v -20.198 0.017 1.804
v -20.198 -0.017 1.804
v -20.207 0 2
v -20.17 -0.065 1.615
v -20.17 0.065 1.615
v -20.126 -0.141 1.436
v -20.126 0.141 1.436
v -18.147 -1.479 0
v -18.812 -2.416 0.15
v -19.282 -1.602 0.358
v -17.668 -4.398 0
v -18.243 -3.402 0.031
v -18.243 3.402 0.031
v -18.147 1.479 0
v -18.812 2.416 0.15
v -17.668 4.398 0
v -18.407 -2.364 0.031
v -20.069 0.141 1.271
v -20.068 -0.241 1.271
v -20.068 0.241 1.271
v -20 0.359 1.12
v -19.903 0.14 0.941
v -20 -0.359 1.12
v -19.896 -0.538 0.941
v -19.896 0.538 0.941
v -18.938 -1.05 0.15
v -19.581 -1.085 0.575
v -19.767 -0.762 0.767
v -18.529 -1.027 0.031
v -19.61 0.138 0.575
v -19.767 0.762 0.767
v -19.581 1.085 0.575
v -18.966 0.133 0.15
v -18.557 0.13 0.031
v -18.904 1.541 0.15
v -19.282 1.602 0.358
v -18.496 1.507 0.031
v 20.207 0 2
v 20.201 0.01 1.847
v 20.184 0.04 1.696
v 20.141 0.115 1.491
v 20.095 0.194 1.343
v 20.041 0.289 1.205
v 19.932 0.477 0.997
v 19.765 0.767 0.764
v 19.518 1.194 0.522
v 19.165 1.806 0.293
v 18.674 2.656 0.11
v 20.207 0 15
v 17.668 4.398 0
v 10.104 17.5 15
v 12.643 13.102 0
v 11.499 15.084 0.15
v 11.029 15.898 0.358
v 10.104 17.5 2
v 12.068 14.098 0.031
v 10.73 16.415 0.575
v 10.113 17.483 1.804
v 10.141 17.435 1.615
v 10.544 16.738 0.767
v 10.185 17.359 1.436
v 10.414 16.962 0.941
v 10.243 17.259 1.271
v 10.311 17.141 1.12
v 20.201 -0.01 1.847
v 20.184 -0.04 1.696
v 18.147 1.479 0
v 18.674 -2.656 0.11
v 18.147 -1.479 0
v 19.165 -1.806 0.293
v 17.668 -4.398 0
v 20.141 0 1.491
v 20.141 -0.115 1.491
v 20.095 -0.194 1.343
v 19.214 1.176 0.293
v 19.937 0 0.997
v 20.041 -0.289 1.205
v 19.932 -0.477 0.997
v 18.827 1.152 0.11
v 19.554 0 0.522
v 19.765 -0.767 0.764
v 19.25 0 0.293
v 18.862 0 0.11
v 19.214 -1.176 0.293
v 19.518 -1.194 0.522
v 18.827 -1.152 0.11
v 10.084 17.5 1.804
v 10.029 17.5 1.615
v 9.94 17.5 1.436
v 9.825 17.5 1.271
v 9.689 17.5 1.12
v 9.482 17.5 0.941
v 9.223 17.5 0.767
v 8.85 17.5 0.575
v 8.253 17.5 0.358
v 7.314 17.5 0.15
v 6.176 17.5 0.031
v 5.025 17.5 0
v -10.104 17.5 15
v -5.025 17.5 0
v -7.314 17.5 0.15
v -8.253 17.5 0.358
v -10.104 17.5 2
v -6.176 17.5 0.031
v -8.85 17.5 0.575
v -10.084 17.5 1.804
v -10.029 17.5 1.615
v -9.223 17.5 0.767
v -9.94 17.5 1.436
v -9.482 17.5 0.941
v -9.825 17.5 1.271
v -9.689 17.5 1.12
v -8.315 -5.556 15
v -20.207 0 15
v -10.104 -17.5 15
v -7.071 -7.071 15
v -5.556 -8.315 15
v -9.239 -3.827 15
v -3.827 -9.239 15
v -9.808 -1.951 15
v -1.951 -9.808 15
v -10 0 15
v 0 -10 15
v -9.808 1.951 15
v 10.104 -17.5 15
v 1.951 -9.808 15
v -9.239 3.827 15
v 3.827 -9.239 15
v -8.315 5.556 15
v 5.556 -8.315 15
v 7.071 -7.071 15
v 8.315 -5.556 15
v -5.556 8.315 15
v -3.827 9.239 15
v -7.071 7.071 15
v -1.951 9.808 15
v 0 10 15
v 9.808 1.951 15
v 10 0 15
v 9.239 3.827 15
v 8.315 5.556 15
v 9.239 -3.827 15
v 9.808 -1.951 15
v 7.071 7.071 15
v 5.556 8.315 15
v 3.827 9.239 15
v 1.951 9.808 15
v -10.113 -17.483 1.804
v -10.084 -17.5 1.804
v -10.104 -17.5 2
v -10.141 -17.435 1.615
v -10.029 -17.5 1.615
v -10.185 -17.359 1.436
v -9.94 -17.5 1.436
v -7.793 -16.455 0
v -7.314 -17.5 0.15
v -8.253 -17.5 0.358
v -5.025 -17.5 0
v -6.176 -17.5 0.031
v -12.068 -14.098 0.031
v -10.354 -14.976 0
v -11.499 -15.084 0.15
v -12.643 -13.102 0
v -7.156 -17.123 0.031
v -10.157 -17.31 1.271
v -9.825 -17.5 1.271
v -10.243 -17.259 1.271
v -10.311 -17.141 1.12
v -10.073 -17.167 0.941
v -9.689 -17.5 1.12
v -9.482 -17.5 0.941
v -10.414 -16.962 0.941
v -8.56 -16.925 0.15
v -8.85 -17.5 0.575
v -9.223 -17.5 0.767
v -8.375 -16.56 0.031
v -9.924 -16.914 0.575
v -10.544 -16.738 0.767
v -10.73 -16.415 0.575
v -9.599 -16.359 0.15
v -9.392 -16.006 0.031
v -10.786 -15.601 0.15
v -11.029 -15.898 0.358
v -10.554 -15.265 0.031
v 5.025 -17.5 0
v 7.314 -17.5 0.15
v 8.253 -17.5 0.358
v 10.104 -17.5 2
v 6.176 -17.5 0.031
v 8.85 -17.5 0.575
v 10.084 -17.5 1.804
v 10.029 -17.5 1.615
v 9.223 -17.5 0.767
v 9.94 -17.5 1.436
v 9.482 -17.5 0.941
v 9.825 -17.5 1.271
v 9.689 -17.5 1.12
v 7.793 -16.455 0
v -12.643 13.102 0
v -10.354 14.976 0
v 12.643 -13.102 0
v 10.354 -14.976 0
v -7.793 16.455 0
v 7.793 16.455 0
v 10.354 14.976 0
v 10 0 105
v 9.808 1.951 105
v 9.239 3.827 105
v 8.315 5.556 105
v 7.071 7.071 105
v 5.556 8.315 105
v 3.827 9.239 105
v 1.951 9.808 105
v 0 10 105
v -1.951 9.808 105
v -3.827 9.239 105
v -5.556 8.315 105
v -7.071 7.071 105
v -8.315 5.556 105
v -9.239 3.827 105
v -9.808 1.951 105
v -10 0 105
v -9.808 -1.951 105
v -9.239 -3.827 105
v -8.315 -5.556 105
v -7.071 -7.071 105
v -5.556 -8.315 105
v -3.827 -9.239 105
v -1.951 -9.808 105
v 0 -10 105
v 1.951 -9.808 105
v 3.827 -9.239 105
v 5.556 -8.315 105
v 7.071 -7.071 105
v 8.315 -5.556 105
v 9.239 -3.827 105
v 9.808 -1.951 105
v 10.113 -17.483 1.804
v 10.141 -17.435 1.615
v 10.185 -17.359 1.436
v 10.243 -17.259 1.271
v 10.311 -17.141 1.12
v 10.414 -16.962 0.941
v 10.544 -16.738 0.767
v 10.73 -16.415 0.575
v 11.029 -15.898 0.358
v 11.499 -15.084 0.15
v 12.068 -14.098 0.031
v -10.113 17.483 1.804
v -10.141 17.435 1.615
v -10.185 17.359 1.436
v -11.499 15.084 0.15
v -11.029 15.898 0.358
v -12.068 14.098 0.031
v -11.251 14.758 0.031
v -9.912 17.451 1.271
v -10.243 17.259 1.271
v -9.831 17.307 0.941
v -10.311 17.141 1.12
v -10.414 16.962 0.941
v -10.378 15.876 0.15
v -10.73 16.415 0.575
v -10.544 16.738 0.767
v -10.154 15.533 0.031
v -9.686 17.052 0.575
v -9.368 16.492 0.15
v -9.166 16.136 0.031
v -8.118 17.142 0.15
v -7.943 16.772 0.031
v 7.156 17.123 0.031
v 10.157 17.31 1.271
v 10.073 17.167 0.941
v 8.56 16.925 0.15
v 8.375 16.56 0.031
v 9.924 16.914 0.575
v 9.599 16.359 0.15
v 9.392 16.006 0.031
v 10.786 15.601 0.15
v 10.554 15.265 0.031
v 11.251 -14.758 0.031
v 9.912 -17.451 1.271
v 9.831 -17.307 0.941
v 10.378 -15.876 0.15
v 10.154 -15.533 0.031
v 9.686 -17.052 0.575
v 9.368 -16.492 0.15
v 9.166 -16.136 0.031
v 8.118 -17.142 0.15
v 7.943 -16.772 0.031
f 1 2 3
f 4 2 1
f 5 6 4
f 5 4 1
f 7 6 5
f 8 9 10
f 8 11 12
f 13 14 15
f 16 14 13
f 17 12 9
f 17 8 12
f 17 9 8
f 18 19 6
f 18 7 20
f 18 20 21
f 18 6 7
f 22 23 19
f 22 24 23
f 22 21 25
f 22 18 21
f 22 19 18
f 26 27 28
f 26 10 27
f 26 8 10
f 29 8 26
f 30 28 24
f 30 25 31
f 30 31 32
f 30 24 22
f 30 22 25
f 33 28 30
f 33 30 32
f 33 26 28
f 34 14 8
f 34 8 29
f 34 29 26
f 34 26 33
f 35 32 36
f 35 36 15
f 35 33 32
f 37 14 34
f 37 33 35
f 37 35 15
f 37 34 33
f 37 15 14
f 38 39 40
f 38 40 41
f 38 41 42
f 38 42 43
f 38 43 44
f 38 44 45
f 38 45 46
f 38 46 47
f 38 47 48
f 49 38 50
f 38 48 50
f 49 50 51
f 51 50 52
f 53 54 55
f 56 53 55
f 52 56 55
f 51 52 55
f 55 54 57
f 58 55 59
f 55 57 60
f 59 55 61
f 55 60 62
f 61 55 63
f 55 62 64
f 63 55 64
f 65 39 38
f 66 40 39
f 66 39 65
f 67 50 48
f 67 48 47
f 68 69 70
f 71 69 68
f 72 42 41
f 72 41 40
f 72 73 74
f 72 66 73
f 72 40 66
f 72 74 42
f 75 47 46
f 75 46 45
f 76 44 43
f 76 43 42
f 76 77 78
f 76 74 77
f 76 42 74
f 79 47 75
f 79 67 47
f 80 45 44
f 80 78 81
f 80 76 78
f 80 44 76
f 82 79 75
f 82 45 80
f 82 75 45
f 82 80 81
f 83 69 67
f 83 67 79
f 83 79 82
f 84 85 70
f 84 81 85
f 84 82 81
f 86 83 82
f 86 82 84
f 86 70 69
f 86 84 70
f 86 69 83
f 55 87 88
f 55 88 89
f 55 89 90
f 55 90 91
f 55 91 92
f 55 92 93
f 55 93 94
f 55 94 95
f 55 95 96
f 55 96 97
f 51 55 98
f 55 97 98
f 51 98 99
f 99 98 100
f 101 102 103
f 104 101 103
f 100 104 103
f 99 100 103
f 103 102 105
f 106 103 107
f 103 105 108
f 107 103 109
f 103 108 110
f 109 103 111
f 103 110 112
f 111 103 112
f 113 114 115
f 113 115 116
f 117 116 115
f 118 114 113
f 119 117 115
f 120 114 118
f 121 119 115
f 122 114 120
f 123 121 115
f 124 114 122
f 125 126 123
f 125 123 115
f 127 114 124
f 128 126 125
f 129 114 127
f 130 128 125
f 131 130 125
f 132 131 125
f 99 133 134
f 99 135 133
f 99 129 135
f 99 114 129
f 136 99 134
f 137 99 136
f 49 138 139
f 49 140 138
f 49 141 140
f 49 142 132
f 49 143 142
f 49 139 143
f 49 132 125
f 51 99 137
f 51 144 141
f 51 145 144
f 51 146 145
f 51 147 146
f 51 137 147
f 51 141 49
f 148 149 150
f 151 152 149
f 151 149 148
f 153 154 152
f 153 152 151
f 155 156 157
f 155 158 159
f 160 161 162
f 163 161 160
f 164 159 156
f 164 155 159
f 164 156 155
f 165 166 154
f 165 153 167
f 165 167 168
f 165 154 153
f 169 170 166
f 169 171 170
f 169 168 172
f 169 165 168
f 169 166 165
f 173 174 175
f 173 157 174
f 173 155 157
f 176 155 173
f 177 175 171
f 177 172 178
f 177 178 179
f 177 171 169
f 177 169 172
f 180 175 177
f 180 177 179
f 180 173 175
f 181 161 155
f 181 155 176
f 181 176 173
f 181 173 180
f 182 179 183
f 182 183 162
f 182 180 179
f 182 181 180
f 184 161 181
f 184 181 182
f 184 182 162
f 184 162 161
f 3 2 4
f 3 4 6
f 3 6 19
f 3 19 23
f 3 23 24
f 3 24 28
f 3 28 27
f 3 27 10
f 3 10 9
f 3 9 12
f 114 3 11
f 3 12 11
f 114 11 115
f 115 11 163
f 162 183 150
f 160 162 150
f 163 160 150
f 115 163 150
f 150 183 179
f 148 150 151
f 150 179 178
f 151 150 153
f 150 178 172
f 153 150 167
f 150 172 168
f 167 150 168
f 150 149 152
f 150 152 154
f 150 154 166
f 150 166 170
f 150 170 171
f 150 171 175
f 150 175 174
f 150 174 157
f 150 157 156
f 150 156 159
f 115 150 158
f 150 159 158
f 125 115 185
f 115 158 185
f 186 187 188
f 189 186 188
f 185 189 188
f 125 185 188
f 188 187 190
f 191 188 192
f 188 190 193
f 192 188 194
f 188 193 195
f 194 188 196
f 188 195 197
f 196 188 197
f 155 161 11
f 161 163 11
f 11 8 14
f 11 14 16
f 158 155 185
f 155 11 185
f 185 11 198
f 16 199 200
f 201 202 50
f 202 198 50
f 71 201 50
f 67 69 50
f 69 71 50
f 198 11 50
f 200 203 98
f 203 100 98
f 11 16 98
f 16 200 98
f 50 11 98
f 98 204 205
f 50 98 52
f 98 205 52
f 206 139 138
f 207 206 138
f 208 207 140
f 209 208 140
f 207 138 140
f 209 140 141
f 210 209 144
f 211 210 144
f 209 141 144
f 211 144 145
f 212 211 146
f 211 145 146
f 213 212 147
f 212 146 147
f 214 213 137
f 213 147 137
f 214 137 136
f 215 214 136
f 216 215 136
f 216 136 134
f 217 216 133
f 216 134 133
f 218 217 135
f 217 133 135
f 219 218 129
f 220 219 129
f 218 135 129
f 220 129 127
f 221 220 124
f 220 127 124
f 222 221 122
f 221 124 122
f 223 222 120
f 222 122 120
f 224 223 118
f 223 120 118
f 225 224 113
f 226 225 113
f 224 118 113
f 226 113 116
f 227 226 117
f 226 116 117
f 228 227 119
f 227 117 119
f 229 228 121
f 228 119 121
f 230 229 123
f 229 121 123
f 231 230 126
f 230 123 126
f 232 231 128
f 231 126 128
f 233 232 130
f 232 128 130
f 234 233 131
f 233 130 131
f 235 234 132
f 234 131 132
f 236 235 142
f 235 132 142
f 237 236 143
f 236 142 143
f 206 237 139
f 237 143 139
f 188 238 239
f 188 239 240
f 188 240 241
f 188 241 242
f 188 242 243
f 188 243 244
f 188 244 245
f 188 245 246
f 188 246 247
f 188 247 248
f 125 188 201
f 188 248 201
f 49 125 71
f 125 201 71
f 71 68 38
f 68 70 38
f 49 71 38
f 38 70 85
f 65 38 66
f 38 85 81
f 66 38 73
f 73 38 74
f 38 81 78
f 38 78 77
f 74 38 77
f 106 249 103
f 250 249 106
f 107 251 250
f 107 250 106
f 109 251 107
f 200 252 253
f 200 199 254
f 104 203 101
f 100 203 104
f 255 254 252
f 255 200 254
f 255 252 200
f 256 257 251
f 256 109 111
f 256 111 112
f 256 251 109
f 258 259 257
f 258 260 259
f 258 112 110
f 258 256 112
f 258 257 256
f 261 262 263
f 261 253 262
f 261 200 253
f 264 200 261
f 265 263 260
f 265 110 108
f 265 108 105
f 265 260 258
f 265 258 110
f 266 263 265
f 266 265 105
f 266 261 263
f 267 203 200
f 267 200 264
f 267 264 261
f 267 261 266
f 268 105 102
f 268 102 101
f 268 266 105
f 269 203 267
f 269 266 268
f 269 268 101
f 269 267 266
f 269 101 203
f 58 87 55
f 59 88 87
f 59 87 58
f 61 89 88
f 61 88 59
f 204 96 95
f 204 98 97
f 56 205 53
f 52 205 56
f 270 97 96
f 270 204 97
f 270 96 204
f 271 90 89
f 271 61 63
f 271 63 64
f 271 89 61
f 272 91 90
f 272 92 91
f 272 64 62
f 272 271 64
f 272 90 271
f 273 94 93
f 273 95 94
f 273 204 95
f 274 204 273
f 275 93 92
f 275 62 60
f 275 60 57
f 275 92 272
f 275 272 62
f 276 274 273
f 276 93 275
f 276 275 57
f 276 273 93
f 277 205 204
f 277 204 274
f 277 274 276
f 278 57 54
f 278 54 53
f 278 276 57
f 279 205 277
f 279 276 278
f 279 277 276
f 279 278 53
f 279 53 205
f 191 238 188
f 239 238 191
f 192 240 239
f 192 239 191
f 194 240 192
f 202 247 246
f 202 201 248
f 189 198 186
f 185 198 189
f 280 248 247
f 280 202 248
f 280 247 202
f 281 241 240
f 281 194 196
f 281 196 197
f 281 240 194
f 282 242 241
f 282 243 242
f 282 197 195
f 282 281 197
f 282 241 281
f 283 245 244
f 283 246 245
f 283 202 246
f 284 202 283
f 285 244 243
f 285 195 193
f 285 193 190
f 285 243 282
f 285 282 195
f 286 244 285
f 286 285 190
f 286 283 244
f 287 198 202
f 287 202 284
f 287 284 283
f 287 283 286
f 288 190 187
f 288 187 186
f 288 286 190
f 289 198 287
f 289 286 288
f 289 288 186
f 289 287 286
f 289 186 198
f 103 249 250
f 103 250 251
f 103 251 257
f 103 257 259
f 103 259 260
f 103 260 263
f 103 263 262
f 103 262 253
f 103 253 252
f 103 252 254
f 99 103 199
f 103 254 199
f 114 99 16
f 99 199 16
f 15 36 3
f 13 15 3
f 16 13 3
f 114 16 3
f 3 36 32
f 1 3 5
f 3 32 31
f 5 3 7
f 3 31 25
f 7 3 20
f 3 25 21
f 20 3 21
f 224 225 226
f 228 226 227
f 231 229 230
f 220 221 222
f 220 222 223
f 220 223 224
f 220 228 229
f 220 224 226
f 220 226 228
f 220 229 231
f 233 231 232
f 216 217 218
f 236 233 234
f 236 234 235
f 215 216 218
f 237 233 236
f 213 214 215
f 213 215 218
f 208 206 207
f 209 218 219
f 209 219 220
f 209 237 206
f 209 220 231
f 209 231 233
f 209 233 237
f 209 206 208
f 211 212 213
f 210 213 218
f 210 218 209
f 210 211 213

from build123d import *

# Parameters (mm, degrees)
BOSS_EXTRUDE1_DEPTH = 15
SKETCH2_R           = 10
BOSS_EXTRUDE2_DEPTH = 90


with BuildPart() as part:
    # Sketch1 → Boss-Extrude1 (new body)
    with BuildSketch(Plane.XY):
        Polygon((-20.207259422, 0), (-10.103629711, -17.5), (10.103629711, -17.5), (20.207259422, 0), (10.103629711, 17.5), (-10.103629711, 17.5), align=None)
    extrude(amount=BOSS_EXTRUDE1_DEPTH)

    # Sketch2 → Boss-Extrude2 (add)
    with BuildSketch(Plane.XY.offset(15)):
        Circle(SKETCH2_R)
    extrude(amount=BOSS_EXTRUDE2_DEPTH)

    # Sketch3 → Cut-Revolve2 (revolve, cut)
    with BuildSketch(Plane(origin=(0, 0, 0), x_dir=(1, 0, 0), z_dir=(0, 1, 0))):
        with BuildLine():
            Line((18.207259422, 0), (20.207259422, 0))
            Line((20.207259422, 0), (20.207259422, -2))
            ThreePointArc((20.207259422, -2), (19.621472984, -0.585786438), (18.207259422, 0))
        make_face()
    revolve(axis=Axis((0, 0, 105), (0, 0, -1)), mode=Mode.SUBTRACT)


solid = part.part
